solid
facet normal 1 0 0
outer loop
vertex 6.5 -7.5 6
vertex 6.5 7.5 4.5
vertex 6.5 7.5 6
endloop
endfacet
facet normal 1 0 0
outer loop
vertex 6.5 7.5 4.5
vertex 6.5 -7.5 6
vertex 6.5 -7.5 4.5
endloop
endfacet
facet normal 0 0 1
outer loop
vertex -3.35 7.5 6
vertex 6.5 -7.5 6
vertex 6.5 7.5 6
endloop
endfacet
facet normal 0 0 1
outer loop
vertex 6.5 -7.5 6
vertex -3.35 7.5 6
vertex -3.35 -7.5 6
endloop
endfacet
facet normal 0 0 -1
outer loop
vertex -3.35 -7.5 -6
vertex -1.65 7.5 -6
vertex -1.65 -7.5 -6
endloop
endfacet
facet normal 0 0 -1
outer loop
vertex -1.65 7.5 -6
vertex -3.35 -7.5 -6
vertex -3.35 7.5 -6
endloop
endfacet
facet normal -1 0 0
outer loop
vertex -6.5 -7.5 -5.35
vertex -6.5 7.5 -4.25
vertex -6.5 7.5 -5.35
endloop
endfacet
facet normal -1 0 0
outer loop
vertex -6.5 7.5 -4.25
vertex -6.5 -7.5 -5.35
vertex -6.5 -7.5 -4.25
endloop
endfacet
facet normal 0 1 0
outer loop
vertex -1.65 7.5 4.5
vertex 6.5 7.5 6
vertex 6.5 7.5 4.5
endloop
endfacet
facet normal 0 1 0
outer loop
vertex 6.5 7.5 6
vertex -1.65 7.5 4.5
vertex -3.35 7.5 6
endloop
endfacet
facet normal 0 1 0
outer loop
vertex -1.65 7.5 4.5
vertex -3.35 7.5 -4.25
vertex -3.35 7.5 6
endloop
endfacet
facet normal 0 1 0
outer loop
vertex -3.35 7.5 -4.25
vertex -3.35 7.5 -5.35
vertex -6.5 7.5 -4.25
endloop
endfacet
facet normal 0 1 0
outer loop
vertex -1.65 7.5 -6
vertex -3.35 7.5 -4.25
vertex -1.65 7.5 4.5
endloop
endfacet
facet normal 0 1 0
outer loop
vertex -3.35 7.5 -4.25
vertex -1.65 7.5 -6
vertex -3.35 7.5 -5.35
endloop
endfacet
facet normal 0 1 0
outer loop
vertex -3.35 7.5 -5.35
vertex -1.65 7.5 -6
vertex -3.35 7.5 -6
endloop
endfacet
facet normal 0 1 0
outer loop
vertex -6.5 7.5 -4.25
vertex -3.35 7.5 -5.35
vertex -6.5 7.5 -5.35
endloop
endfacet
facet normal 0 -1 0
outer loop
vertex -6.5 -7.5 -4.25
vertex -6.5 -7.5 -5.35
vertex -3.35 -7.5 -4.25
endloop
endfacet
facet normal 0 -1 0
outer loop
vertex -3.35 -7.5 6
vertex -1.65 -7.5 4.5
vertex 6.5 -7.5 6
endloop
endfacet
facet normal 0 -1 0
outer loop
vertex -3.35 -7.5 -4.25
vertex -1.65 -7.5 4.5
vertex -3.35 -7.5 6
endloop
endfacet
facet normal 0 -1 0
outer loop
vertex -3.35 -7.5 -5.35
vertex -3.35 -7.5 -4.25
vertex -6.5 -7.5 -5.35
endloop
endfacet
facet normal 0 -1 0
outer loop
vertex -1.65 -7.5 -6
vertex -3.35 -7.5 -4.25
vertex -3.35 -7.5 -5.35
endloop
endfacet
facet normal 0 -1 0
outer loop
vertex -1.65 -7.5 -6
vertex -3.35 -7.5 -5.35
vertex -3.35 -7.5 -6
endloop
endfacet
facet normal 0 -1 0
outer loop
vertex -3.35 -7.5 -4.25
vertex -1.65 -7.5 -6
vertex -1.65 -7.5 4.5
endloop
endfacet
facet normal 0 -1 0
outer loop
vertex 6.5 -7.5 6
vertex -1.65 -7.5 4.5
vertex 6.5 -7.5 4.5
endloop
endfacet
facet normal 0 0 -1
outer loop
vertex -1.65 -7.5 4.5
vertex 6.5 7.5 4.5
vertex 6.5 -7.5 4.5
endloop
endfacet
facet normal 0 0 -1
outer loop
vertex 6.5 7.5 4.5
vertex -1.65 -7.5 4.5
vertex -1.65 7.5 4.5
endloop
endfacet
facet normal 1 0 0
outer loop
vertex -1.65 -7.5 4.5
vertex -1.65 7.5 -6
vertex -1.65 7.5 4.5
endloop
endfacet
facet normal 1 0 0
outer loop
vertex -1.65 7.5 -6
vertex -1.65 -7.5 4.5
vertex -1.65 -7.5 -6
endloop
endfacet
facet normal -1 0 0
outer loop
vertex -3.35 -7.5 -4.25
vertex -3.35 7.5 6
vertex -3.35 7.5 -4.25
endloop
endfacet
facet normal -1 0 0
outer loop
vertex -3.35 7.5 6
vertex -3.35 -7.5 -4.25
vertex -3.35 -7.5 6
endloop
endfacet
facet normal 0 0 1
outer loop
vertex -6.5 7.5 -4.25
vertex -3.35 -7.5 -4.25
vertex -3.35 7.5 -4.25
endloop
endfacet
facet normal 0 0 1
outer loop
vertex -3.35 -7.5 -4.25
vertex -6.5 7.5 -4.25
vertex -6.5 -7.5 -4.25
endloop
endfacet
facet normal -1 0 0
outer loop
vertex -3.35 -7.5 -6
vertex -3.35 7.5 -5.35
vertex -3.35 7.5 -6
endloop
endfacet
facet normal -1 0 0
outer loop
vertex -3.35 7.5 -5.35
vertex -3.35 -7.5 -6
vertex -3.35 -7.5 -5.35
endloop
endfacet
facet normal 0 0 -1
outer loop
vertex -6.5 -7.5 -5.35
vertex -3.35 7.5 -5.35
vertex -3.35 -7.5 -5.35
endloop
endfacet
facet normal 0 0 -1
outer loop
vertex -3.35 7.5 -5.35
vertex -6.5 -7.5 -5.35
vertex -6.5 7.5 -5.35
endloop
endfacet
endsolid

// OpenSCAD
$fn=50;

difference(){
	cube([13, 15, 12], center=true);
	translate([5,0,-2]) cube([13.3, 20.1, 13], center=true);
	translate([-10,0,0.9]) cube([13.3, 20.1, 10.3], center=true);
	translate([-10,0,-10.5]) cube([13.3, 20.1, 10.3], center=true);
}
